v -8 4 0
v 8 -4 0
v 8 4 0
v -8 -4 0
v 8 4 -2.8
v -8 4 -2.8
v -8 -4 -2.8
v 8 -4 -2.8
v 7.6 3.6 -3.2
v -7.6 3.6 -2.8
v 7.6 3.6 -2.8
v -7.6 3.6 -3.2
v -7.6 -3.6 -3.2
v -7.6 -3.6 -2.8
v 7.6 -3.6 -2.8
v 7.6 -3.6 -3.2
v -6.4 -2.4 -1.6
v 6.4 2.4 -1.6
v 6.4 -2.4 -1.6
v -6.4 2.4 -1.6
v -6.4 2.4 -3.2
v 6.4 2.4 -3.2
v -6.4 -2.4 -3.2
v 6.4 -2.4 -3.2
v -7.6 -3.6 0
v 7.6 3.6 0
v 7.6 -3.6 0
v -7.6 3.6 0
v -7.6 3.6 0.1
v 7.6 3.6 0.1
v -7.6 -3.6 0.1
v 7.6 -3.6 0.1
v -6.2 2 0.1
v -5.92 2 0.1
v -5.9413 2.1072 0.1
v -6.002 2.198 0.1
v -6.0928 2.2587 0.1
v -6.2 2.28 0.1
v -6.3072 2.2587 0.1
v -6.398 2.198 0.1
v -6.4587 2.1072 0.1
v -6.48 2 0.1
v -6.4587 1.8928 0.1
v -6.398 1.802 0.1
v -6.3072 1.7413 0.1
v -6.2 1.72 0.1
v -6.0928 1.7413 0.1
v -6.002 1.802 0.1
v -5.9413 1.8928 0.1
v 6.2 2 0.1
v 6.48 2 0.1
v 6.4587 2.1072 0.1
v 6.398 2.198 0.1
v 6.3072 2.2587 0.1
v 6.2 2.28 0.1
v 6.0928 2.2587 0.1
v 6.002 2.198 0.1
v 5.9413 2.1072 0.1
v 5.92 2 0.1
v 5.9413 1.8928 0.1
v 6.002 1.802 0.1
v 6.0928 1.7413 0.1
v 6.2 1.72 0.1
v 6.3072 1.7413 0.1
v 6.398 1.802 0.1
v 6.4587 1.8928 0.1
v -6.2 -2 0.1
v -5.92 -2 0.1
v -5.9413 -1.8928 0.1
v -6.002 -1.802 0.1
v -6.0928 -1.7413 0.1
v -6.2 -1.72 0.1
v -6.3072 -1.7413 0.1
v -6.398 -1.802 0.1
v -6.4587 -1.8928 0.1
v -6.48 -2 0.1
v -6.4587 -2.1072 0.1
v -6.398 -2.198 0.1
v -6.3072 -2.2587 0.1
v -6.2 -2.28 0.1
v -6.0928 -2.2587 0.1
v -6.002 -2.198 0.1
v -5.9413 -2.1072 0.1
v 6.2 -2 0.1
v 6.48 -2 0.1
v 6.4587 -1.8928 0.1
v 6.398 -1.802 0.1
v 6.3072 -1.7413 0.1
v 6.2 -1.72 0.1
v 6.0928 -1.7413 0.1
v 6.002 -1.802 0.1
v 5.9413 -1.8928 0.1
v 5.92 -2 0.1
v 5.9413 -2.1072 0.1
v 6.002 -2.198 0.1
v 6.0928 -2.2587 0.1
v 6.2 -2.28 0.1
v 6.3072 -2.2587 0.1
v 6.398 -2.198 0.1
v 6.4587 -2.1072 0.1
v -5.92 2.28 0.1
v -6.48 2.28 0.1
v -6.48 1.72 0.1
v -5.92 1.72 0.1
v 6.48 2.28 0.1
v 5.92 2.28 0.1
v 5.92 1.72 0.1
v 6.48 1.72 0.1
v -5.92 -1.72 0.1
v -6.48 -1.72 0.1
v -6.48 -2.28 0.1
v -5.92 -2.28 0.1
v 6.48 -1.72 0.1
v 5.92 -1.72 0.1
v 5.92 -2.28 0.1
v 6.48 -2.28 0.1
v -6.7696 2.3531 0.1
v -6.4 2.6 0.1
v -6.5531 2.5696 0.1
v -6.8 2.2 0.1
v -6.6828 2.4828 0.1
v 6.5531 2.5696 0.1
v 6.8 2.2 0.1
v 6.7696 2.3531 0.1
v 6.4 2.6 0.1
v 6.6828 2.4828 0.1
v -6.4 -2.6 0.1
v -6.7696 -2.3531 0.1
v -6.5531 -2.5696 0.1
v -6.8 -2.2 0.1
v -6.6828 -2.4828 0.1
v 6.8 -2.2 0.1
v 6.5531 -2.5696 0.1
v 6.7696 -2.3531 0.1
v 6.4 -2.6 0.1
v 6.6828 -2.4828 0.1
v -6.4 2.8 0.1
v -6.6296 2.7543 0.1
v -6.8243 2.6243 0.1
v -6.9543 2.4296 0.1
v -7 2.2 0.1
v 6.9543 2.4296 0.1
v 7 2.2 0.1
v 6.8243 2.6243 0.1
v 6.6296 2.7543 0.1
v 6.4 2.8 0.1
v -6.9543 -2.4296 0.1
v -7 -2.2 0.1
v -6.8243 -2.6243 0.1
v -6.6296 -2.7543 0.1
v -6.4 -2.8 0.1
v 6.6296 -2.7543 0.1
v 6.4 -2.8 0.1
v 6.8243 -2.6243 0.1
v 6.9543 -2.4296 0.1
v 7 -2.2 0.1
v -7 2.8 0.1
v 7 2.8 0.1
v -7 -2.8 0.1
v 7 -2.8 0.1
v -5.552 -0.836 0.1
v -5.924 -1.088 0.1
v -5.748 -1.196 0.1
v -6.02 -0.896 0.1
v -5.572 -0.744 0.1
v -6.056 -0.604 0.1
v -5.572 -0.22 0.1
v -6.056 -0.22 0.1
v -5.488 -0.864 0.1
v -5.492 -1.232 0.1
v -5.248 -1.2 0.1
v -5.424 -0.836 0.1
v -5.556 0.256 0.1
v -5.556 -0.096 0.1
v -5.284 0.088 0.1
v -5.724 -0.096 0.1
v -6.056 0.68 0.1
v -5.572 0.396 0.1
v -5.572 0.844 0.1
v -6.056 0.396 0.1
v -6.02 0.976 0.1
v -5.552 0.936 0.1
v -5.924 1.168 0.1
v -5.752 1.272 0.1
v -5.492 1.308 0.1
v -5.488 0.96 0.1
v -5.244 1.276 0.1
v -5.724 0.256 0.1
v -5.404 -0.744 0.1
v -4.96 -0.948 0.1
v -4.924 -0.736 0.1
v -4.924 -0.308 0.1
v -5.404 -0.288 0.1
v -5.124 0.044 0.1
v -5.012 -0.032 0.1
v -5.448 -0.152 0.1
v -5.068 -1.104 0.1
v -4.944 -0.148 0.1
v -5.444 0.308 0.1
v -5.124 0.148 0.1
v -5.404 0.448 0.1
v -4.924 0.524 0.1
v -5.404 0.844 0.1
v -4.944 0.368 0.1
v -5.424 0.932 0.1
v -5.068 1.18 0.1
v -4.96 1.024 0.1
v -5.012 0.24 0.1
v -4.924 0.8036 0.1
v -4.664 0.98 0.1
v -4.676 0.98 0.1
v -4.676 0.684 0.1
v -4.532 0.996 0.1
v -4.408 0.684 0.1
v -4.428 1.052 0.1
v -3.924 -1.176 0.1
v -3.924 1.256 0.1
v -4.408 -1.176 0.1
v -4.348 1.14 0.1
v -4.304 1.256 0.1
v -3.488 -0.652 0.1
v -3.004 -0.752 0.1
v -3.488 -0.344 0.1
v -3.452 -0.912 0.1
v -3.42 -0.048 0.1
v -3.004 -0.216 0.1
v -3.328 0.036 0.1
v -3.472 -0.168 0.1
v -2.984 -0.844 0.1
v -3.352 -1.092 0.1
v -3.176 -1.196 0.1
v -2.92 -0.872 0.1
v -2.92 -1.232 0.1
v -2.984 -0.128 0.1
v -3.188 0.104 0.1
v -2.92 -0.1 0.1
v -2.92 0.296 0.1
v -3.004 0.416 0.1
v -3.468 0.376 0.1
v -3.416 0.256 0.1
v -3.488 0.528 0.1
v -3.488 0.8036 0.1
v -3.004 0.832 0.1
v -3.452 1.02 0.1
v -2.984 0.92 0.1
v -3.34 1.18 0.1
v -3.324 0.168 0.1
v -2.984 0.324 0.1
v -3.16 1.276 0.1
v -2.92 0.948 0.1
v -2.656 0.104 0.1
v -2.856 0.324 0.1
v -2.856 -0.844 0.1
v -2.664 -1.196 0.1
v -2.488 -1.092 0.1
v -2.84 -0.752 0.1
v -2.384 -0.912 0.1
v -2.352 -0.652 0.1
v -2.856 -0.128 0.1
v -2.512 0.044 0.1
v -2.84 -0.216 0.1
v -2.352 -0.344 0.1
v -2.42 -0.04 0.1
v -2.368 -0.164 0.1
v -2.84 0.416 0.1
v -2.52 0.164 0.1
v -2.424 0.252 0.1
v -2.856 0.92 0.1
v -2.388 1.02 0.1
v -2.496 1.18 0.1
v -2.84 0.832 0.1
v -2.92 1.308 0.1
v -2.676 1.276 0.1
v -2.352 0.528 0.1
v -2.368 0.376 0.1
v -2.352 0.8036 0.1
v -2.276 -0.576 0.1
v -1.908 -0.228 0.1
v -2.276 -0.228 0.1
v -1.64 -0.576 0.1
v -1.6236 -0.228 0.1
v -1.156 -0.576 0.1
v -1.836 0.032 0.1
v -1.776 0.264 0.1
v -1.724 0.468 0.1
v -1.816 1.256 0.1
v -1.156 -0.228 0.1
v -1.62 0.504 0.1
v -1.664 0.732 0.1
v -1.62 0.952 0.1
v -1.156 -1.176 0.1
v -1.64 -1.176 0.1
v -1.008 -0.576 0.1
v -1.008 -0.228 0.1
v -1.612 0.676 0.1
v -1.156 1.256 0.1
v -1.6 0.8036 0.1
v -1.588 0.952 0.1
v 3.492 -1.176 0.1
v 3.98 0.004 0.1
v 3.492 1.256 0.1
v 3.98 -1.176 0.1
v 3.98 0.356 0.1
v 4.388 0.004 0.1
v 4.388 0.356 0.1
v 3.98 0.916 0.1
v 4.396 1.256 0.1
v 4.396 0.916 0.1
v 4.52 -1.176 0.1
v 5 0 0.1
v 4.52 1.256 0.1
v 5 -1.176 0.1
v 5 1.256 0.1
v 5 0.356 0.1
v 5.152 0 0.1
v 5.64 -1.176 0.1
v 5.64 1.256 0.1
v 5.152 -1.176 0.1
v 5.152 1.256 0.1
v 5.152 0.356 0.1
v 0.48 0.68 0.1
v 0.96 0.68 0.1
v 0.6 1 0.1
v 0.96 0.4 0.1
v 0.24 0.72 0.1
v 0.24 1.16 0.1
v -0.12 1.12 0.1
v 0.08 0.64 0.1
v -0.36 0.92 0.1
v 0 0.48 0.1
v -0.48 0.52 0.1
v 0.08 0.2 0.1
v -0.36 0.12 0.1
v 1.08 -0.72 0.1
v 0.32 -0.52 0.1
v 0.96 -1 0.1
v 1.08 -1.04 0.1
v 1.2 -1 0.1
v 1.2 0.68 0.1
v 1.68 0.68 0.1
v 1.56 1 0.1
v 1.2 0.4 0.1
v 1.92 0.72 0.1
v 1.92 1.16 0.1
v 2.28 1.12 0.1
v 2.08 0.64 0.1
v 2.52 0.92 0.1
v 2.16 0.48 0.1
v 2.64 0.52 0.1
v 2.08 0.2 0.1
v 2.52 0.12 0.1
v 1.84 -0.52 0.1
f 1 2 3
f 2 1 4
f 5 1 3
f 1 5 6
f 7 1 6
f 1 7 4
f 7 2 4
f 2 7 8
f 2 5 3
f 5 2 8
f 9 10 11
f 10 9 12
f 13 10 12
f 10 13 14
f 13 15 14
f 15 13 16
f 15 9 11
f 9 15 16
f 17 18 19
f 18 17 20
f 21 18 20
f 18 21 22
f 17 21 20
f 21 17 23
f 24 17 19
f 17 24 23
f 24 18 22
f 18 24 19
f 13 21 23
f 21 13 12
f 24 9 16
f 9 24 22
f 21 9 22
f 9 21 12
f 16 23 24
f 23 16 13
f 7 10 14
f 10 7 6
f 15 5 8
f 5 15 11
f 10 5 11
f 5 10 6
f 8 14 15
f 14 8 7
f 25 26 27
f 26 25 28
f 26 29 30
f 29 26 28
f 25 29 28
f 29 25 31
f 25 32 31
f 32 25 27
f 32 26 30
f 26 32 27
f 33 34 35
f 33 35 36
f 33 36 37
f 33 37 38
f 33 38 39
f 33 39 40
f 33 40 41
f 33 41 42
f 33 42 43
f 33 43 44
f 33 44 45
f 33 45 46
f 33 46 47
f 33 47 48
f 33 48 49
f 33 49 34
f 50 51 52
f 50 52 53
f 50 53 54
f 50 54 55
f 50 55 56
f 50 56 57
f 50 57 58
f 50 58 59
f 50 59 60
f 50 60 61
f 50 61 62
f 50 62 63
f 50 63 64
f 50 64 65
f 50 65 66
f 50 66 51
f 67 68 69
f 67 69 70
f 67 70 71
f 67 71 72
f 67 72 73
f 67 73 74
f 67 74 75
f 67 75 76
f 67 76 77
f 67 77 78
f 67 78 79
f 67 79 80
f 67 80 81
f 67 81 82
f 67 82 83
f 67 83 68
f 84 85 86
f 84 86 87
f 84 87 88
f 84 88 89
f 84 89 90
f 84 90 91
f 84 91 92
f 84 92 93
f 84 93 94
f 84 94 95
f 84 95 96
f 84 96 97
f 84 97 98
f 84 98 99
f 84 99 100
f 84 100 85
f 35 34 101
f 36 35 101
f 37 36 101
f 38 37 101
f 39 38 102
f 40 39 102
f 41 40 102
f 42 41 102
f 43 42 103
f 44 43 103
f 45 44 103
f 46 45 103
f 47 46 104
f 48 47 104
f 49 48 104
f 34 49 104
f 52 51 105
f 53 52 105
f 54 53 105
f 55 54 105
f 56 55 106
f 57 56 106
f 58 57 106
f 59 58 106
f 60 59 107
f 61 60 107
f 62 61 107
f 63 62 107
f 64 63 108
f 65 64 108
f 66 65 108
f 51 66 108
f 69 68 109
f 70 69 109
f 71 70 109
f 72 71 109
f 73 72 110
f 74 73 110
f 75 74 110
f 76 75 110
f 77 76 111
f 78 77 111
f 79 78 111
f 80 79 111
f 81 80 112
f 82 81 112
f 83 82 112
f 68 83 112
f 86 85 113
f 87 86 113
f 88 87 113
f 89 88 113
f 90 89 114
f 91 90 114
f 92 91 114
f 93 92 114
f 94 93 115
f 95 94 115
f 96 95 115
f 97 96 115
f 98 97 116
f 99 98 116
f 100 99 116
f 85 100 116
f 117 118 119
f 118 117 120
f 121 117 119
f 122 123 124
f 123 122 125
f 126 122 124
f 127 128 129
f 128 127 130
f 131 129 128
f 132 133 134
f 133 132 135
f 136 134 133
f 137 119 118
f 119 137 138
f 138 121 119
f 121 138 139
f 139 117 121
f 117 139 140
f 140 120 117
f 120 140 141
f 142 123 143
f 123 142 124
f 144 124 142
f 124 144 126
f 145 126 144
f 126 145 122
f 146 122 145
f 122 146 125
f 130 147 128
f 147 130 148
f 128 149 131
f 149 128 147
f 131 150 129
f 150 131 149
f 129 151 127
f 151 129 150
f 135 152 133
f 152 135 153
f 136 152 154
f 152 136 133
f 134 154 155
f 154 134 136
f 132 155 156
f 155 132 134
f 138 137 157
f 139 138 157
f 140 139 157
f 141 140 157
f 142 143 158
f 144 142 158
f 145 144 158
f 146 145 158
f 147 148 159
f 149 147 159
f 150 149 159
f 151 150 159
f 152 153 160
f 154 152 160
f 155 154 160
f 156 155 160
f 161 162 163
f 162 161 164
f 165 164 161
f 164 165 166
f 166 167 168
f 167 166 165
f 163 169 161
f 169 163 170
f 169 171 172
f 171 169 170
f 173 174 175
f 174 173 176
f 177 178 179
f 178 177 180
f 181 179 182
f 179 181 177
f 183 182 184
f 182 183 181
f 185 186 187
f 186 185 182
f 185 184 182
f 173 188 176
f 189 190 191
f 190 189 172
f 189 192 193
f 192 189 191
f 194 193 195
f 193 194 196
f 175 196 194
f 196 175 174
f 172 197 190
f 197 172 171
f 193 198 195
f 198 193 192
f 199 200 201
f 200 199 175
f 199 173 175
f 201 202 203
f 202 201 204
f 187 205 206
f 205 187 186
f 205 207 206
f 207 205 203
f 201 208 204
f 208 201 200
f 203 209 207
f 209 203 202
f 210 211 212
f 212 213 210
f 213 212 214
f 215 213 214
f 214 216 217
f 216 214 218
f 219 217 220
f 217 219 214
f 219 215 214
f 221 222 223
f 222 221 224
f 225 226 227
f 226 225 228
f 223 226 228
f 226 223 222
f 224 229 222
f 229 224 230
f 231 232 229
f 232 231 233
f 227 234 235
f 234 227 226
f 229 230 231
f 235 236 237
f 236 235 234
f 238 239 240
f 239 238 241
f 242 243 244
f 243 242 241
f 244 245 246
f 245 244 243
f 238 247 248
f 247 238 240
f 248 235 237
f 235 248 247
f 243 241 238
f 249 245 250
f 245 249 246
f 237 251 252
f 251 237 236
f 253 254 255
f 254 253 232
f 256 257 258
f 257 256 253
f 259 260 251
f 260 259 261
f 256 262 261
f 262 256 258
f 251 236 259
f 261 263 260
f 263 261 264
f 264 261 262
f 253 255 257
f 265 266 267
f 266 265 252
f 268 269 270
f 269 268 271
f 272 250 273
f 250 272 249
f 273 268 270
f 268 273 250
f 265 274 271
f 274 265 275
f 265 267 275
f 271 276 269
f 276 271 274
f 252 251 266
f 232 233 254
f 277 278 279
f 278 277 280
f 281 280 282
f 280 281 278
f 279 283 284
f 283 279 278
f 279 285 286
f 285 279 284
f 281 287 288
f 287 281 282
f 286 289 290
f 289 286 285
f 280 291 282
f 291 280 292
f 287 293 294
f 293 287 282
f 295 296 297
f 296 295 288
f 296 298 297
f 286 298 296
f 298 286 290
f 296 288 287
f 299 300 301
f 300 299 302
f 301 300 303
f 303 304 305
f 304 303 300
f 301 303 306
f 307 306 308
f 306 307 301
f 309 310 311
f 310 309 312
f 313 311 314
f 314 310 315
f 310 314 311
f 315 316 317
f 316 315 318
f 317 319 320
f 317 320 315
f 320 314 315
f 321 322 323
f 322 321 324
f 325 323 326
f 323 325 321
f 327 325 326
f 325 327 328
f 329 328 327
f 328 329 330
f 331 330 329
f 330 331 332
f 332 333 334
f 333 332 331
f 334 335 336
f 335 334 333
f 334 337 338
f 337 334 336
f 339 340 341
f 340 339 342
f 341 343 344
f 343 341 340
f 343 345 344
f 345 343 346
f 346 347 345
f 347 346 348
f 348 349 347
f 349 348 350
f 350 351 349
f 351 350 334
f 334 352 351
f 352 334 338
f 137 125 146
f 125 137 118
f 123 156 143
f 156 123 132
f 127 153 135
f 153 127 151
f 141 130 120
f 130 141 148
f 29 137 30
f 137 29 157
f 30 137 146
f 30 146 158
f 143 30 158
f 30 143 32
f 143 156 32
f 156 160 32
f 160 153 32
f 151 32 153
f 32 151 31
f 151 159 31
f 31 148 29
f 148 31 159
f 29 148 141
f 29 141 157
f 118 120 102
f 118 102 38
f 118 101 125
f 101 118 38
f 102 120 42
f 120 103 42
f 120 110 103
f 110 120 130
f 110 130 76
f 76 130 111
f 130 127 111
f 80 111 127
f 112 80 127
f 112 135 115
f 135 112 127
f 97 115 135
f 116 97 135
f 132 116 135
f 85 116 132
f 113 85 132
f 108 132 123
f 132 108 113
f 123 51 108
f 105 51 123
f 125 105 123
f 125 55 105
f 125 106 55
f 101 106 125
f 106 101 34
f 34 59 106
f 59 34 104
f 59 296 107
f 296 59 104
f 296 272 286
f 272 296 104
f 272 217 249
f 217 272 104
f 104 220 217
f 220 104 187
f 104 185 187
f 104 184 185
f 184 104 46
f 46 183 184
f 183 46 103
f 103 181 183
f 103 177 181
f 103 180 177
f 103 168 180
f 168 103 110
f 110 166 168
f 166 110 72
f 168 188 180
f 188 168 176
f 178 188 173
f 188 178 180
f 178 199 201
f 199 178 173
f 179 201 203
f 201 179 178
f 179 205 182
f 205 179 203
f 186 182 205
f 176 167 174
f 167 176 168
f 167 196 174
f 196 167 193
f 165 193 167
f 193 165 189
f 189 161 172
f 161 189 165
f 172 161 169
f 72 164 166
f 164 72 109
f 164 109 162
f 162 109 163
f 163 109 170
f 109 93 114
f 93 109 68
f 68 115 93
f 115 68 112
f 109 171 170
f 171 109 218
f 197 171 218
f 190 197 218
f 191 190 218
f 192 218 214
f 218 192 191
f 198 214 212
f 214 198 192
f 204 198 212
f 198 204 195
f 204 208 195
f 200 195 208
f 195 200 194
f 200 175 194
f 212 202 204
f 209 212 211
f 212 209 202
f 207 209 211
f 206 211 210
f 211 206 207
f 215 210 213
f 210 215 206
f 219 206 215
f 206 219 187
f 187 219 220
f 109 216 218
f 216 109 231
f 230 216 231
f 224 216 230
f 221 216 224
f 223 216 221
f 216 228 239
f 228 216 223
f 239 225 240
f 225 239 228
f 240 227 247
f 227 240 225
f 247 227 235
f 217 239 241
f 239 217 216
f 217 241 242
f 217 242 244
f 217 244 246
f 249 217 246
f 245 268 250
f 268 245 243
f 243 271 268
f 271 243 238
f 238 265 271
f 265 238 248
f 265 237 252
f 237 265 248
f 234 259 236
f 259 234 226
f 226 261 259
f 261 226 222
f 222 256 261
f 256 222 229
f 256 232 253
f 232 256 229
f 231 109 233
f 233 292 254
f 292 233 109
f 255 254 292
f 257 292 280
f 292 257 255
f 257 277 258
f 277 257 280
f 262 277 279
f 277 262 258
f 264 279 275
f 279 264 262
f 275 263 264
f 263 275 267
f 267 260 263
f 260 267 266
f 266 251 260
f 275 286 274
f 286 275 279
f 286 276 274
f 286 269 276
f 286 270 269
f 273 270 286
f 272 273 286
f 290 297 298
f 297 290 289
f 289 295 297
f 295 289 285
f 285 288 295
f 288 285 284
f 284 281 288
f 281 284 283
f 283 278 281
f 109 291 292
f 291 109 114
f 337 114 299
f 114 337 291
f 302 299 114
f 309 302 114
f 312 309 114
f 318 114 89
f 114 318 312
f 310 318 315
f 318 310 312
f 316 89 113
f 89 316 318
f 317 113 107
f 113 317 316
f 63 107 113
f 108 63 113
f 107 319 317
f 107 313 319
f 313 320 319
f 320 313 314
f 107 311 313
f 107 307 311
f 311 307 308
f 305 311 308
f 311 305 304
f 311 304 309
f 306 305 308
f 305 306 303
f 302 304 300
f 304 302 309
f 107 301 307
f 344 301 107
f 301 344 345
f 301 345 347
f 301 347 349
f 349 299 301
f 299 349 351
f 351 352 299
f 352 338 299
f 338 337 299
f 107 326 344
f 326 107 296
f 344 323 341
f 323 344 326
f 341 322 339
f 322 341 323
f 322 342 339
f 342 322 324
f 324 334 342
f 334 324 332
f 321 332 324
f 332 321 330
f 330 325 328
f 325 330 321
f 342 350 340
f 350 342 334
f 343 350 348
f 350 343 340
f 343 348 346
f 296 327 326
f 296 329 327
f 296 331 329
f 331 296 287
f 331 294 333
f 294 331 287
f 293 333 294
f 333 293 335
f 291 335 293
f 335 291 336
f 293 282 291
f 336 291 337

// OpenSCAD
use <../lib.scad>
use <3069b.scad>
use <4620856f.scad>
function ldraw_lib__3069bdf2() = [
// 0 Tile  1 x  2 with Medium Azure Heart and "3184 FH" License Plate Sticker
// 0 Name: 3069bdf2.dat
// 0 Author: Takeshi Takahashi [RainbowDolphin]
// 0 !LDRAW_ORG Shortcut UPDATE 2024-08
// 0 !LICENSE Licensed under CC BY 4.0 : see CAreadme.txt
// 
// 0 BFC CERTIFY CCW
  [0,"BFC","CERTIFY"],
  [0,"BFC","CCW"],
// 
// 0 !CATEGORY Sticker Shortcut
// 0 !KEYWORDS Adventure camper, Bricklink 3069pb0275, Friends, Set 3184
// 
// 0 !HISTORY 2024-09-30 [OrionP] Official Update 2024-08
// 
// 1 16 0 0 0 1 0 0 0 1 0 0 0 1 3069b.dat
  [1,16,0,0,0,1,0,0,0,1,0,0,0,1, ldraw_lib__3069b()],
// 1 16 0 0 0 1 0 0 0 1 0 0 0 1 4620856f.dat
  [1,16,0,0,0,1,0,0,0,1,0,0,0,1, ldraw_lib__4620856f()],
];
module ldraw_lib__3069bdf2(step=0, col=false, unit=2/5, alt=false, line=0.2, solid=!$preview)
    makepoly(ldraw_lib__3069bdf2(), step=step, col=col, unit=unit, alt=alt, line=line, solid=solid);
ldraw_lib__3069bdf2(line=0.2);
